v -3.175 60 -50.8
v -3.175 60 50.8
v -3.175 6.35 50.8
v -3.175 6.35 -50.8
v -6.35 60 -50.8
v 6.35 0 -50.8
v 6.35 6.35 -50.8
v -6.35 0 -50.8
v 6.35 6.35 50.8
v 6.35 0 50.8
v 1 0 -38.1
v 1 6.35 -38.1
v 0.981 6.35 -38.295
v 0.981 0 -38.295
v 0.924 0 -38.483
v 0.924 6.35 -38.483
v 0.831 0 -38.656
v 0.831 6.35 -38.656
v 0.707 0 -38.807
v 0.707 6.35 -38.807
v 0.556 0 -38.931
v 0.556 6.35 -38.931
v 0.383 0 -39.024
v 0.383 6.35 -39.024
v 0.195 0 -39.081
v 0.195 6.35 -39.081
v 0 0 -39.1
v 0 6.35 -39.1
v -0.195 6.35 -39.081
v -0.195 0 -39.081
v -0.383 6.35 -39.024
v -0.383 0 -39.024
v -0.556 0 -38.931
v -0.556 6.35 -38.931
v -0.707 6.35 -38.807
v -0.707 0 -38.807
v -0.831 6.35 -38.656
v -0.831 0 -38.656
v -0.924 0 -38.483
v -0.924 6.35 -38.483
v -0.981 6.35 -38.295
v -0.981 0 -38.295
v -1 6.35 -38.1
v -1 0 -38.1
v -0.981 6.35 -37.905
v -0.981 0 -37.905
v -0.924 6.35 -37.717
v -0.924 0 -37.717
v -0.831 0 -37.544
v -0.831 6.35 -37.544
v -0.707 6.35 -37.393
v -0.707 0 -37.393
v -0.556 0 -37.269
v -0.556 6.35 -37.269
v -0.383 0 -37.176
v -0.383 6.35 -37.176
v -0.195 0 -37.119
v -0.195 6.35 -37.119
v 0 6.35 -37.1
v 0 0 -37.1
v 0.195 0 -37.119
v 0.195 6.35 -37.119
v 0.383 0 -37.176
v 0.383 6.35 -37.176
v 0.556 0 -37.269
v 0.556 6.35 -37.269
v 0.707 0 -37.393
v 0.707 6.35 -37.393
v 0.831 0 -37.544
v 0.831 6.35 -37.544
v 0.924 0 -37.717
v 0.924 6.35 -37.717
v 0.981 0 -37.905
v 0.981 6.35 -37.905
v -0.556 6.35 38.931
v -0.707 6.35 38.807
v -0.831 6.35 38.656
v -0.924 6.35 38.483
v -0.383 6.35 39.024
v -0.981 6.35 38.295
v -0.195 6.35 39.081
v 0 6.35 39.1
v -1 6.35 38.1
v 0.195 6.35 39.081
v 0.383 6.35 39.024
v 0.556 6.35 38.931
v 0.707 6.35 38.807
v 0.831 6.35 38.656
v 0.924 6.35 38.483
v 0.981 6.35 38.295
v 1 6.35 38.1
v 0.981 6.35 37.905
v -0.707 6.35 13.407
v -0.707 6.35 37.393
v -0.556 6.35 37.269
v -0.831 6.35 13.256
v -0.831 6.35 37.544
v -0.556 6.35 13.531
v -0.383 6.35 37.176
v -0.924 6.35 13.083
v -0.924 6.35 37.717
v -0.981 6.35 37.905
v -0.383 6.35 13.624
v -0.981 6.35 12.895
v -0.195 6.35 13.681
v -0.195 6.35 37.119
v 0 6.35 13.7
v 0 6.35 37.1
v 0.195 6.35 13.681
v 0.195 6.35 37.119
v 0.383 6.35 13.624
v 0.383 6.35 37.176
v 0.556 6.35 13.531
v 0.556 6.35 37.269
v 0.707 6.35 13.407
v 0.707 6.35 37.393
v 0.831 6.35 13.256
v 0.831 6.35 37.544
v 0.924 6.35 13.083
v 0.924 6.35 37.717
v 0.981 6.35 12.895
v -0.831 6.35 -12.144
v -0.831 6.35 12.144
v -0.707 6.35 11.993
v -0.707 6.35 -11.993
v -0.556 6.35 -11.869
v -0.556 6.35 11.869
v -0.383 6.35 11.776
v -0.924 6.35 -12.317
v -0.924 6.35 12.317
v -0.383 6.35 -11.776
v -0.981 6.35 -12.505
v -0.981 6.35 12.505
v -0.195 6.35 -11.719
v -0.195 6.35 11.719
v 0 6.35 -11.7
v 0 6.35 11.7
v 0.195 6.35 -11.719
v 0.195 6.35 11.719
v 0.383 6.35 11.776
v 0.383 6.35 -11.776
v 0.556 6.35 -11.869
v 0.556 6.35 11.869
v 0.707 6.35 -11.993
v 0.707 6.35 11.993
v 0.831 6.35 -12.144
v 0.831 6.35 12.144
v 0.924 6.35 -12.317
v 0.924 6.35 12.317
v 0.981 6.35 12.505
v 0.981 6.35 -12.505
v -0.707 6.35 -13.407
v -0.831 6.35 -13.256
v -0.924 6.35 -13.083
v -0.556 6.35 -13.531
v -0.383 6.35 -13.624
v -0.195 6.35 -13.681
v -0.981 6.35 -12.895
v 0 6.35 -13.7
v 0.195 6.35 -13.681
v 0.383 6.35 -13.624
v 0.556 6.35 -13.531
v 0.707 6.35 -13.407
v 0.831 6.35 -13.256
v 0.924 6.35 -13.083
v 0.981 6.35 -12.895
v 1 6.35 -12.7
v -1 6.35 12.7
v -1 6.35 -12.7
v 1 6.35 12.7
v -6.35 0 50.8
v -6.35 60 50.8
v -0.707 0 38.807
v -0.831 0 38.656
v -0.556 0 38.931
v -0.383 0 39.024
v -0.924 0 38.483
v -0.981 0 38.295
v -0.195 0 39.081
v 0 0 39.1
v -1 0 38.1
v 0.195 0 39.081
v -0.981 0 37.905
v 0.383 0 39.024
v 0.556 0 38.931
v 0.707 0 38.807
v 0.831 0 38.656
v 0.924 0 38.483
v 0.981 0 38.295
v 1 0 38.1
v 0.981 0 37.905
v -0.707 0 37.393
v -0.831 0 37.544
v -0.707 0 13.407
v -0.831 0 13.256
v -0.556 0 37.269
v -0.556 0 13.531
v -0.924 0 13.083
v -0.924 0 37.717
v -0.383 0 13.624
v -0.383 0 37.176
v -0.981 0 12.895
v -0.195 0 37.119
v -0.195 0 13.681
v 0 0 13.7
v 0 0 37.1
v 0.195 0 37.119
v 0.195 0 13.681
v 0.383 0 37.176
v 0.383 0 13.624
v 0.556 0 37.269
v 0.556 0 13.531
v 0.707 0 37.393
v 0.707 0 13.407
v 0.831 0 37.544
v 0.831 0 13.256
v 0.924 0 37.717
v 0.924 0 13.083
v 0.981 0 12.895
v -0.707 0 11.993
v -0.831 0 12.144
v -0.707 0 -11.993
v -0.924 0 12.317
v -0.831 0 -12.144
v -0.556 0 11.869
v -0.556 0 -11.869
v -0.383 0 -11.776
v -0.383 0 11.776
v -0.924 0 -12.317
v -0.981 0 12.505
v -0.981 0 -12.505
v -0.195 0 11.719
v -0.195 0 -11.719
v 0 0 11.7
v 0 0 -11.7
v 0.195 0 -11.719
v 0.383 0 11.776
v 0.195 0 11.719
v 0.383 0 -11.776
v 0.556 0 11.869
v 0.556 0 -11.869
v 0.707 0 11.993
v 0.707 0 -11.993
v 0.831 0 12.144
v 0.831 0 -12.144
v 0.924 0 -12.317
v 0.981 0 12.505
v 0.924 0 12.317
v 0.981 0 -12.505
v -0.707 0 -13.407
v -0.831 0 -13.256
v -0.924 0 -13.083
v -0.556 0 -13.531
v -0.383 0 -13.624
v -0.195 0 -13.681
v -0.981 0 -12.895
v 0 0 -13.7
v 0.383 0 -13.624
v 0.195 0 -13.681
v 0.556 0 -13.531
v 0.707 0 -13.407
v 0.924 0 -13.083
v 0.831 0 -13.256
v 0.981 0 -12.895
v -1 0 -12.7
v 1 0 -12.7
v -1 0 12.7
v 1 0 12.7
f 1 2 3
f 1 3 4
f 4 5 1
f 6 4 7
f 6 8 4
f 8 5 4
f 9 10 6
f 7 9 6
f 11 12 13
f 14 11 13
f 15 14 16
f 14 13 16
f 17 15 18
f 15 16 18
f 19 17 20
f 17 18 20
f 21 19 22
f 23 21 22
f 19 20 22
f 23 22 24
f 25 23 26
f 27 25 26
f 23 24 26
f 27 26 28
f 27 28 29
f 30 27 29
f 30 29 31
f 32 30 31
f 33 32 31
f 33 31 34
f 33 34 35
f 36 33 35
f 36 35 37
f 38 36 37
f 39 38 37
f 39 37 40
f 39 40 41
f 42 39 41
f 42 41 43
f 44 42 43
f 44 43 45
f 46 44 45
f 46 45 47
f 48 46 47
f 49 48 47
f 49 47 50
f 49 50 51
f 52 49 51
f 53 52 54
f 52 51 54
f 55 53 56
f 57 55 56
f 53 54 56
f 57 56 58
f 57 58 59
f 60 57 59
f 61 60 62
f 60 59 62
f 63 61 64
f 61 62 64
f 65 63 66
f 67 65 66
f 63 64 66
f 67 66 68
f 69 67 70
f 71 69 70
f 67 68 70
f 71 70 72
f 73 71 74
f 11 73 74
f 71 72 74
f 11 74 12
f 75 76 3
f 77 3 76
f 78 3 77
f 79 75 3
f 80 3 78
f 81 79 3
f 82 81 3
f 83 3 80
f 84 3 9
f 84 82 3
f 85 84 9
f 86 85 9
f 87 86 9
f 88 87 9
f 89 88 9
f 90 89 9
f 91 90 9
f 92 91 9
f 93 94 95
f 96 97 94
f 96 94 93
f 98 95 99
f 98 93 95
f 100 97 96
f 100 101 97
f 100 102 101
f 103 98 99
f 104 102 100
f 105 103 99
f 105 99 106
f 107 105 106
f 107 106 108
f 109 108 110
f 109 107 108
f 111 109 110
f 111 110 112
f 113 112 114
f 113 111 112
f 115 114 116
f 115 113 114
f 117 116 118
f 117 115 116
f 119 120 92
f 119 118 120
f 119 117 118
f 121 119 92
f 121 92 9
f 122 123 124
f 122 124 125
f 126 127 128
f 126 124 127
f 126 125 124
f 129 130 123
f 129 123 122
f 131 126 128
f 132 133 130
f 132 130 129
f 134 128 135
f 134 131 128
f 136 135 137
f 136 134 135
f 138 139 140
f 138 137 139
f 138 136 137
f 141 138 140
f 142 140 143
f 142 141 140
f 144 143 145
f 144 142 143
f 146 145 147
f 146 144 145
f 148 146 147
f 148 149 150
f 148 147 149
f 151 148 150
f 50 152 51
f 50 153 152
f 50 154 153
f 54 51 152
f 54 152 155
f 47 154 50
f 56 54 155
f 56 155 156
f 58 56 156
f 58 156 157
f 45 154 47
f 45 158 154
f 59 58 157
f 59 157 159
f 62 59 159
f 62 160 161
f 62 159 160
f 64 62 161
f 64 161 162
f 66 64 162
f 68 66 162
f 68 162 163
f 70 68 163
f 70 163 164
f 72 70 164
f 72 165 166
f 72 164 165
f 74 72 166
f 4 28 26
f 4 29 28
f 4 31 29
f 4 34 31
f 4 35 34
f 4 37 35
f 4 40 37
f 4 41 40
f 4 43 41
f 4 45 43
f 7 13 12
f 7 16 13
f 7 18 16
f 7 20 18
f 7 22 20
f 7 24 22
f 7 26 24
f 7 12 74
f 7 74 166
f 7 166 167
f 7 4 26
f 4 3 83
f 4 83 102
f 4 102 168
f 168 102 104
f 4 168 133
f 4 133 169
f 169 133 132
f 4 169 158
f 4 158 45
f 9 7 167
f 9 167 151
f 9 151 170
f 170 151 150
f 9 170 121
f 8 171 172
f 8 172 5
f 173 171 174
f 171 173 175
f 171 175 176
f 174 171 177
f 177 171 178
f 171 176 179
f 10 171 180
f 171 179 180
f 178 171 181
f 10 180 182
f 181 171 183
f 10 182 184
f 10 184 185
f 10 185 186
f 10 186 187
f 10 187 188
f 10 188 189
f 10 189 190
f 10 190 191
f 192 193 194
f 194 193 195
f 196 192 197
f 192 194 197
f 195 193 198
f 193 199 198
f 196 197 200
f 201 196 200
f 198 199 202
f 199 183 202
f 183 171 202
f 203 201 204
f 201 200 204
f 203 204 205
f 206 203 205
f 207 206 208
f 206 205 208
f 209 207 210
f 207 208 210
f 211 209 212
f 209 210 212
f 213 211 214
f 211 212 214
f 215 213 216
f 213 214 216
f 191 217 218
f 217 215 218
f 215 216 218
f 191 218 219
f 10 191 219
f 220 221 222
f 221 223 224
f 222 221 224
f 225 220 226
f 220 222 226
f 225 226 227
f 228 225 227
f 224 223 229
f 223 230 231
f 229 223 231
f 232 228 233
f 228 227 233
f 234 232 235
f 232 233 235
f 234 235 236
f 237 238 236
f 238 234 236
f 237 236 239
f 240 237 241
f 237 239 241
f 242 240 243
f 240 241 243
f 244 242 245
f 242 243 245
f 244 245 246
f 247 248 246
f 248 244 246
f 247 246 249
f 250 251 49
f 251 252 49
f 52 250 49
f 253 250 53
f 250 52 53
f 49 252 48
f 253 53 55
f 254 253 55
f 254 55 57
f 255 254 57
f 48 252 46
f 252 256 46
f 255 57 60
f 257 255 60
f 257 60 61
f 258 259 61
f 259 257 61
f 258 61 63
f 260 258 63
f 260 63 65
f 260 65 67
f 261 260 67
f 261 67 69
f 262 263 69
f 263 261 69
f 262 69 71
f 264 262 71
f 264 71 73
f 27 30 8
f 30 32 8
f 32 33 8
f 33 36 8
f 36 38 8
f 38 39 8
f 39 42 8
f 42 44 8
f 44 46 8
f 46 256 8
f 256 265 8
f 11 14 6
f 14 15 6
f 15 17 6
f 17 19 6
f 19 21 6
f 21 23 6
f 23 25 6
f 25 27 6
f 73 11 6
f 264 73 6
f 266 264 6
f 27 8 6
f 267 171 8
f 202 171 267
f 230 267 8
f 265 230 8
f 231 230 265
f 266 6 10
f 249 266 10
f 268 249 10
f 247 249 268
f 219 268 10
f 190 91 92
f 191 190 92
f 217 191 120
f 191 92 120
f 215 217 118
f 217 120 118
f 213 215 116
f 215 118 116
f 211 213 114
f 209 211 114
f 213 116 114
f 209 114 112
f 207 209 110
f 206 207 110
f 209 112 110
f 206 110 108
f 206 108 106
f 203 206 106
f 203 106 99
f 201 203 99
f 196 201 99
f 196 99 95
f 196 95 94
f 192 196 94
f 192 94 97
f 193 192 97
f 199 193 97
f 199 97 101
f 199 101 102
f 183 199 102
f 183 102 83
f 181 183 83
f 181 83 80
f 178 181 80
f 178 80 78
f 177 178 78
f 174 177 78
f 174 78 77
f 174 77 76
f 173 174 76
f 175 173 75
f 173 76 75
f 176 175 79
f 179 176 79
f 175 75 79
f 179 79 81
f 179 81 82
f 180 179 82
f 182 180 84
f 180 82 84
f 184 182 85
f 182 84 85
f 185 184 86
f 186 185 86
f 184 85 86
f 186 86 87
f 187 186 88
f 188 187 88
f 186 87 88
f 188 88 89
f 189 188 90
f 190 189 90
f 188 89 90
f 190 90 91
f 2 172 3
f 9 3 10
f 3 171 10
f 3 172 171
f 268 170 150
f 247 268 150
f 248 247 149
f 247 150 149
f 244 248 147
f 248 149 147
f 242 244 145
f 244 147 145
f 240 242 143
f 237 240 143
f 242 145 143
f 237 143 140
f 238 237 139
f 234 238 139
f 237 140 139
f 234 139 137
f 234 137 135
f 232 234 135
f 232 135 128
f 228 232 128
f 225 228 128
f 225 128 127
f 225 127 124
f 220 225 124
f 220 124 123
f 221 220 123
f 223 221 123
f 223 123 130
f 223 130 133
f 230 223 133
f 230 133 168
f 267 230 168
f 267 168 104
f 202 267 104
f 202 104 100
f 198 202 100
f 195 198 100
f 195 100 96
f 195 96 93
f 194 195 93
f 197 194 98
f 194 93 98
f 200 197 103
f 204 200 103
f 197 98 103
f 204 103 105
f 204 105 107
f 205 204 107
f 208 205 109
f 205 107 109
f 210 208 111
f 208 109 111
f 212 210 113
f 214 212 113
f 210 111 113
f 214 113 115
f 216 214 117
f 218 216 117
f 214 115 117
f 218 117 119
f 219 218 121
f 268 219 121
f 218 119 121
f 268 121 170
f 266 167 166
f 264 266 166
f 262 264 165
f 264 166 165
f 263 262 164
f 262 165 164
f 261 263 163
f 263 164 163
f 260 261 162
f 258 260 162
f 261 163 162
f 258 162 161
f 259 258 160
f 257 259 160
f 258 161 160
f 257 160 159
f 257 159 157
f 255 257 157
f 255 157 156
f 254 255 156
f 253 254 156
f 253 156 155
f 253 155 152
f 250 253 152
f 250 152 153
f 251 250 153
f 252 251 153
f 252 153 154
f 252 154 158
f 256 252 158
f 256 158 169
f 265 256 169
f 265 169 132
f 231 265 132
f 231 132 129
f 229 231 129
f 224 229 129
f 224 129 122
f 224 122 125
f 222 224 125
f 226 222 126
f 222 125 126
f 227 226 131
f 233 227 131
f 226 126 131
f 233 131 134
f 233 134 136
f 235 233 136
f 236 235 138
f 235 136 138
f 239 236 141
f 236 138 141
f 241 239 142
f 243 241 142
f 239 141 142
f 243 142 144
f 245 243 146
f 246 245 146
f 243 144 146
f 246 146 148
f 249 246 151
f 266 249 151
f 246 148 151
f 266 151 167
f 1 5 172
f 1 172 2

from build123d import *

# Parameters (mm, degrees)
SKETCH1_W           = 12.7
SKETCH1_H           = 101.6
BOSS_EXTRUDE1_DEPTH = 59.999999888
SKETCH2_W           = 9.525
SKETCH2_H           = 101.6
CUT_EXTRUDE1_DEPTH  = 53.65
SKETCH3_R           = 1.000000032
CUT_EXTRUDE2_DEPTH  = 7.35


with BuildPart() as part:
    # Sketch1 → Boss-Extrude1 (new body)
    with BuildSketch(Plane(origin=(0, 0, 0), x_dir=(1, 0, 0), z_dir=(0, 1, 0))):
        Rectangle(SKETCH1_W, SKETCH1_H)
    extrude(amount=BOSS_EXTRUDE1_DEPTH)

    # Sketch2 → Cut-Extrude1 (cut)
    with BuildSketch(Plane(origin=(0, 59.999999888, 0), x_dir=(1, 0, 0), z_dir=(0, 1, 0))):
        with Locations((1.5875, 0)):
            Rectangle(SKETCH2_W, SKETCH2_H)
    extrude(amount=-CUT_EXTRUDE1_DEPTH, mode=Mode.SUBTRACT)

    # Sketch3 → Cut-Extrude2 (cut, through all)
    with BuildSketch(Plane(origin=(0, 6.35, 0), x_dir=(1, 0, 0), z_dir=(0, 1, 0))):
        with Locations((0, 38.1)):
            Circle(SKETCH3_R)
        with Locations((0, 12.7)):
            Circle(SKETCH3_R)
        with Locations((0, -12.7)):
            Circle(SKETCH3_R)
        with Locations((0, -38.1)):
            Circle(SKETCH3_R)
    extrude(amount=-CUT_EXTRUDE2_DEPTH, mode=Mode.SUBTRACT)


solid = part.part
